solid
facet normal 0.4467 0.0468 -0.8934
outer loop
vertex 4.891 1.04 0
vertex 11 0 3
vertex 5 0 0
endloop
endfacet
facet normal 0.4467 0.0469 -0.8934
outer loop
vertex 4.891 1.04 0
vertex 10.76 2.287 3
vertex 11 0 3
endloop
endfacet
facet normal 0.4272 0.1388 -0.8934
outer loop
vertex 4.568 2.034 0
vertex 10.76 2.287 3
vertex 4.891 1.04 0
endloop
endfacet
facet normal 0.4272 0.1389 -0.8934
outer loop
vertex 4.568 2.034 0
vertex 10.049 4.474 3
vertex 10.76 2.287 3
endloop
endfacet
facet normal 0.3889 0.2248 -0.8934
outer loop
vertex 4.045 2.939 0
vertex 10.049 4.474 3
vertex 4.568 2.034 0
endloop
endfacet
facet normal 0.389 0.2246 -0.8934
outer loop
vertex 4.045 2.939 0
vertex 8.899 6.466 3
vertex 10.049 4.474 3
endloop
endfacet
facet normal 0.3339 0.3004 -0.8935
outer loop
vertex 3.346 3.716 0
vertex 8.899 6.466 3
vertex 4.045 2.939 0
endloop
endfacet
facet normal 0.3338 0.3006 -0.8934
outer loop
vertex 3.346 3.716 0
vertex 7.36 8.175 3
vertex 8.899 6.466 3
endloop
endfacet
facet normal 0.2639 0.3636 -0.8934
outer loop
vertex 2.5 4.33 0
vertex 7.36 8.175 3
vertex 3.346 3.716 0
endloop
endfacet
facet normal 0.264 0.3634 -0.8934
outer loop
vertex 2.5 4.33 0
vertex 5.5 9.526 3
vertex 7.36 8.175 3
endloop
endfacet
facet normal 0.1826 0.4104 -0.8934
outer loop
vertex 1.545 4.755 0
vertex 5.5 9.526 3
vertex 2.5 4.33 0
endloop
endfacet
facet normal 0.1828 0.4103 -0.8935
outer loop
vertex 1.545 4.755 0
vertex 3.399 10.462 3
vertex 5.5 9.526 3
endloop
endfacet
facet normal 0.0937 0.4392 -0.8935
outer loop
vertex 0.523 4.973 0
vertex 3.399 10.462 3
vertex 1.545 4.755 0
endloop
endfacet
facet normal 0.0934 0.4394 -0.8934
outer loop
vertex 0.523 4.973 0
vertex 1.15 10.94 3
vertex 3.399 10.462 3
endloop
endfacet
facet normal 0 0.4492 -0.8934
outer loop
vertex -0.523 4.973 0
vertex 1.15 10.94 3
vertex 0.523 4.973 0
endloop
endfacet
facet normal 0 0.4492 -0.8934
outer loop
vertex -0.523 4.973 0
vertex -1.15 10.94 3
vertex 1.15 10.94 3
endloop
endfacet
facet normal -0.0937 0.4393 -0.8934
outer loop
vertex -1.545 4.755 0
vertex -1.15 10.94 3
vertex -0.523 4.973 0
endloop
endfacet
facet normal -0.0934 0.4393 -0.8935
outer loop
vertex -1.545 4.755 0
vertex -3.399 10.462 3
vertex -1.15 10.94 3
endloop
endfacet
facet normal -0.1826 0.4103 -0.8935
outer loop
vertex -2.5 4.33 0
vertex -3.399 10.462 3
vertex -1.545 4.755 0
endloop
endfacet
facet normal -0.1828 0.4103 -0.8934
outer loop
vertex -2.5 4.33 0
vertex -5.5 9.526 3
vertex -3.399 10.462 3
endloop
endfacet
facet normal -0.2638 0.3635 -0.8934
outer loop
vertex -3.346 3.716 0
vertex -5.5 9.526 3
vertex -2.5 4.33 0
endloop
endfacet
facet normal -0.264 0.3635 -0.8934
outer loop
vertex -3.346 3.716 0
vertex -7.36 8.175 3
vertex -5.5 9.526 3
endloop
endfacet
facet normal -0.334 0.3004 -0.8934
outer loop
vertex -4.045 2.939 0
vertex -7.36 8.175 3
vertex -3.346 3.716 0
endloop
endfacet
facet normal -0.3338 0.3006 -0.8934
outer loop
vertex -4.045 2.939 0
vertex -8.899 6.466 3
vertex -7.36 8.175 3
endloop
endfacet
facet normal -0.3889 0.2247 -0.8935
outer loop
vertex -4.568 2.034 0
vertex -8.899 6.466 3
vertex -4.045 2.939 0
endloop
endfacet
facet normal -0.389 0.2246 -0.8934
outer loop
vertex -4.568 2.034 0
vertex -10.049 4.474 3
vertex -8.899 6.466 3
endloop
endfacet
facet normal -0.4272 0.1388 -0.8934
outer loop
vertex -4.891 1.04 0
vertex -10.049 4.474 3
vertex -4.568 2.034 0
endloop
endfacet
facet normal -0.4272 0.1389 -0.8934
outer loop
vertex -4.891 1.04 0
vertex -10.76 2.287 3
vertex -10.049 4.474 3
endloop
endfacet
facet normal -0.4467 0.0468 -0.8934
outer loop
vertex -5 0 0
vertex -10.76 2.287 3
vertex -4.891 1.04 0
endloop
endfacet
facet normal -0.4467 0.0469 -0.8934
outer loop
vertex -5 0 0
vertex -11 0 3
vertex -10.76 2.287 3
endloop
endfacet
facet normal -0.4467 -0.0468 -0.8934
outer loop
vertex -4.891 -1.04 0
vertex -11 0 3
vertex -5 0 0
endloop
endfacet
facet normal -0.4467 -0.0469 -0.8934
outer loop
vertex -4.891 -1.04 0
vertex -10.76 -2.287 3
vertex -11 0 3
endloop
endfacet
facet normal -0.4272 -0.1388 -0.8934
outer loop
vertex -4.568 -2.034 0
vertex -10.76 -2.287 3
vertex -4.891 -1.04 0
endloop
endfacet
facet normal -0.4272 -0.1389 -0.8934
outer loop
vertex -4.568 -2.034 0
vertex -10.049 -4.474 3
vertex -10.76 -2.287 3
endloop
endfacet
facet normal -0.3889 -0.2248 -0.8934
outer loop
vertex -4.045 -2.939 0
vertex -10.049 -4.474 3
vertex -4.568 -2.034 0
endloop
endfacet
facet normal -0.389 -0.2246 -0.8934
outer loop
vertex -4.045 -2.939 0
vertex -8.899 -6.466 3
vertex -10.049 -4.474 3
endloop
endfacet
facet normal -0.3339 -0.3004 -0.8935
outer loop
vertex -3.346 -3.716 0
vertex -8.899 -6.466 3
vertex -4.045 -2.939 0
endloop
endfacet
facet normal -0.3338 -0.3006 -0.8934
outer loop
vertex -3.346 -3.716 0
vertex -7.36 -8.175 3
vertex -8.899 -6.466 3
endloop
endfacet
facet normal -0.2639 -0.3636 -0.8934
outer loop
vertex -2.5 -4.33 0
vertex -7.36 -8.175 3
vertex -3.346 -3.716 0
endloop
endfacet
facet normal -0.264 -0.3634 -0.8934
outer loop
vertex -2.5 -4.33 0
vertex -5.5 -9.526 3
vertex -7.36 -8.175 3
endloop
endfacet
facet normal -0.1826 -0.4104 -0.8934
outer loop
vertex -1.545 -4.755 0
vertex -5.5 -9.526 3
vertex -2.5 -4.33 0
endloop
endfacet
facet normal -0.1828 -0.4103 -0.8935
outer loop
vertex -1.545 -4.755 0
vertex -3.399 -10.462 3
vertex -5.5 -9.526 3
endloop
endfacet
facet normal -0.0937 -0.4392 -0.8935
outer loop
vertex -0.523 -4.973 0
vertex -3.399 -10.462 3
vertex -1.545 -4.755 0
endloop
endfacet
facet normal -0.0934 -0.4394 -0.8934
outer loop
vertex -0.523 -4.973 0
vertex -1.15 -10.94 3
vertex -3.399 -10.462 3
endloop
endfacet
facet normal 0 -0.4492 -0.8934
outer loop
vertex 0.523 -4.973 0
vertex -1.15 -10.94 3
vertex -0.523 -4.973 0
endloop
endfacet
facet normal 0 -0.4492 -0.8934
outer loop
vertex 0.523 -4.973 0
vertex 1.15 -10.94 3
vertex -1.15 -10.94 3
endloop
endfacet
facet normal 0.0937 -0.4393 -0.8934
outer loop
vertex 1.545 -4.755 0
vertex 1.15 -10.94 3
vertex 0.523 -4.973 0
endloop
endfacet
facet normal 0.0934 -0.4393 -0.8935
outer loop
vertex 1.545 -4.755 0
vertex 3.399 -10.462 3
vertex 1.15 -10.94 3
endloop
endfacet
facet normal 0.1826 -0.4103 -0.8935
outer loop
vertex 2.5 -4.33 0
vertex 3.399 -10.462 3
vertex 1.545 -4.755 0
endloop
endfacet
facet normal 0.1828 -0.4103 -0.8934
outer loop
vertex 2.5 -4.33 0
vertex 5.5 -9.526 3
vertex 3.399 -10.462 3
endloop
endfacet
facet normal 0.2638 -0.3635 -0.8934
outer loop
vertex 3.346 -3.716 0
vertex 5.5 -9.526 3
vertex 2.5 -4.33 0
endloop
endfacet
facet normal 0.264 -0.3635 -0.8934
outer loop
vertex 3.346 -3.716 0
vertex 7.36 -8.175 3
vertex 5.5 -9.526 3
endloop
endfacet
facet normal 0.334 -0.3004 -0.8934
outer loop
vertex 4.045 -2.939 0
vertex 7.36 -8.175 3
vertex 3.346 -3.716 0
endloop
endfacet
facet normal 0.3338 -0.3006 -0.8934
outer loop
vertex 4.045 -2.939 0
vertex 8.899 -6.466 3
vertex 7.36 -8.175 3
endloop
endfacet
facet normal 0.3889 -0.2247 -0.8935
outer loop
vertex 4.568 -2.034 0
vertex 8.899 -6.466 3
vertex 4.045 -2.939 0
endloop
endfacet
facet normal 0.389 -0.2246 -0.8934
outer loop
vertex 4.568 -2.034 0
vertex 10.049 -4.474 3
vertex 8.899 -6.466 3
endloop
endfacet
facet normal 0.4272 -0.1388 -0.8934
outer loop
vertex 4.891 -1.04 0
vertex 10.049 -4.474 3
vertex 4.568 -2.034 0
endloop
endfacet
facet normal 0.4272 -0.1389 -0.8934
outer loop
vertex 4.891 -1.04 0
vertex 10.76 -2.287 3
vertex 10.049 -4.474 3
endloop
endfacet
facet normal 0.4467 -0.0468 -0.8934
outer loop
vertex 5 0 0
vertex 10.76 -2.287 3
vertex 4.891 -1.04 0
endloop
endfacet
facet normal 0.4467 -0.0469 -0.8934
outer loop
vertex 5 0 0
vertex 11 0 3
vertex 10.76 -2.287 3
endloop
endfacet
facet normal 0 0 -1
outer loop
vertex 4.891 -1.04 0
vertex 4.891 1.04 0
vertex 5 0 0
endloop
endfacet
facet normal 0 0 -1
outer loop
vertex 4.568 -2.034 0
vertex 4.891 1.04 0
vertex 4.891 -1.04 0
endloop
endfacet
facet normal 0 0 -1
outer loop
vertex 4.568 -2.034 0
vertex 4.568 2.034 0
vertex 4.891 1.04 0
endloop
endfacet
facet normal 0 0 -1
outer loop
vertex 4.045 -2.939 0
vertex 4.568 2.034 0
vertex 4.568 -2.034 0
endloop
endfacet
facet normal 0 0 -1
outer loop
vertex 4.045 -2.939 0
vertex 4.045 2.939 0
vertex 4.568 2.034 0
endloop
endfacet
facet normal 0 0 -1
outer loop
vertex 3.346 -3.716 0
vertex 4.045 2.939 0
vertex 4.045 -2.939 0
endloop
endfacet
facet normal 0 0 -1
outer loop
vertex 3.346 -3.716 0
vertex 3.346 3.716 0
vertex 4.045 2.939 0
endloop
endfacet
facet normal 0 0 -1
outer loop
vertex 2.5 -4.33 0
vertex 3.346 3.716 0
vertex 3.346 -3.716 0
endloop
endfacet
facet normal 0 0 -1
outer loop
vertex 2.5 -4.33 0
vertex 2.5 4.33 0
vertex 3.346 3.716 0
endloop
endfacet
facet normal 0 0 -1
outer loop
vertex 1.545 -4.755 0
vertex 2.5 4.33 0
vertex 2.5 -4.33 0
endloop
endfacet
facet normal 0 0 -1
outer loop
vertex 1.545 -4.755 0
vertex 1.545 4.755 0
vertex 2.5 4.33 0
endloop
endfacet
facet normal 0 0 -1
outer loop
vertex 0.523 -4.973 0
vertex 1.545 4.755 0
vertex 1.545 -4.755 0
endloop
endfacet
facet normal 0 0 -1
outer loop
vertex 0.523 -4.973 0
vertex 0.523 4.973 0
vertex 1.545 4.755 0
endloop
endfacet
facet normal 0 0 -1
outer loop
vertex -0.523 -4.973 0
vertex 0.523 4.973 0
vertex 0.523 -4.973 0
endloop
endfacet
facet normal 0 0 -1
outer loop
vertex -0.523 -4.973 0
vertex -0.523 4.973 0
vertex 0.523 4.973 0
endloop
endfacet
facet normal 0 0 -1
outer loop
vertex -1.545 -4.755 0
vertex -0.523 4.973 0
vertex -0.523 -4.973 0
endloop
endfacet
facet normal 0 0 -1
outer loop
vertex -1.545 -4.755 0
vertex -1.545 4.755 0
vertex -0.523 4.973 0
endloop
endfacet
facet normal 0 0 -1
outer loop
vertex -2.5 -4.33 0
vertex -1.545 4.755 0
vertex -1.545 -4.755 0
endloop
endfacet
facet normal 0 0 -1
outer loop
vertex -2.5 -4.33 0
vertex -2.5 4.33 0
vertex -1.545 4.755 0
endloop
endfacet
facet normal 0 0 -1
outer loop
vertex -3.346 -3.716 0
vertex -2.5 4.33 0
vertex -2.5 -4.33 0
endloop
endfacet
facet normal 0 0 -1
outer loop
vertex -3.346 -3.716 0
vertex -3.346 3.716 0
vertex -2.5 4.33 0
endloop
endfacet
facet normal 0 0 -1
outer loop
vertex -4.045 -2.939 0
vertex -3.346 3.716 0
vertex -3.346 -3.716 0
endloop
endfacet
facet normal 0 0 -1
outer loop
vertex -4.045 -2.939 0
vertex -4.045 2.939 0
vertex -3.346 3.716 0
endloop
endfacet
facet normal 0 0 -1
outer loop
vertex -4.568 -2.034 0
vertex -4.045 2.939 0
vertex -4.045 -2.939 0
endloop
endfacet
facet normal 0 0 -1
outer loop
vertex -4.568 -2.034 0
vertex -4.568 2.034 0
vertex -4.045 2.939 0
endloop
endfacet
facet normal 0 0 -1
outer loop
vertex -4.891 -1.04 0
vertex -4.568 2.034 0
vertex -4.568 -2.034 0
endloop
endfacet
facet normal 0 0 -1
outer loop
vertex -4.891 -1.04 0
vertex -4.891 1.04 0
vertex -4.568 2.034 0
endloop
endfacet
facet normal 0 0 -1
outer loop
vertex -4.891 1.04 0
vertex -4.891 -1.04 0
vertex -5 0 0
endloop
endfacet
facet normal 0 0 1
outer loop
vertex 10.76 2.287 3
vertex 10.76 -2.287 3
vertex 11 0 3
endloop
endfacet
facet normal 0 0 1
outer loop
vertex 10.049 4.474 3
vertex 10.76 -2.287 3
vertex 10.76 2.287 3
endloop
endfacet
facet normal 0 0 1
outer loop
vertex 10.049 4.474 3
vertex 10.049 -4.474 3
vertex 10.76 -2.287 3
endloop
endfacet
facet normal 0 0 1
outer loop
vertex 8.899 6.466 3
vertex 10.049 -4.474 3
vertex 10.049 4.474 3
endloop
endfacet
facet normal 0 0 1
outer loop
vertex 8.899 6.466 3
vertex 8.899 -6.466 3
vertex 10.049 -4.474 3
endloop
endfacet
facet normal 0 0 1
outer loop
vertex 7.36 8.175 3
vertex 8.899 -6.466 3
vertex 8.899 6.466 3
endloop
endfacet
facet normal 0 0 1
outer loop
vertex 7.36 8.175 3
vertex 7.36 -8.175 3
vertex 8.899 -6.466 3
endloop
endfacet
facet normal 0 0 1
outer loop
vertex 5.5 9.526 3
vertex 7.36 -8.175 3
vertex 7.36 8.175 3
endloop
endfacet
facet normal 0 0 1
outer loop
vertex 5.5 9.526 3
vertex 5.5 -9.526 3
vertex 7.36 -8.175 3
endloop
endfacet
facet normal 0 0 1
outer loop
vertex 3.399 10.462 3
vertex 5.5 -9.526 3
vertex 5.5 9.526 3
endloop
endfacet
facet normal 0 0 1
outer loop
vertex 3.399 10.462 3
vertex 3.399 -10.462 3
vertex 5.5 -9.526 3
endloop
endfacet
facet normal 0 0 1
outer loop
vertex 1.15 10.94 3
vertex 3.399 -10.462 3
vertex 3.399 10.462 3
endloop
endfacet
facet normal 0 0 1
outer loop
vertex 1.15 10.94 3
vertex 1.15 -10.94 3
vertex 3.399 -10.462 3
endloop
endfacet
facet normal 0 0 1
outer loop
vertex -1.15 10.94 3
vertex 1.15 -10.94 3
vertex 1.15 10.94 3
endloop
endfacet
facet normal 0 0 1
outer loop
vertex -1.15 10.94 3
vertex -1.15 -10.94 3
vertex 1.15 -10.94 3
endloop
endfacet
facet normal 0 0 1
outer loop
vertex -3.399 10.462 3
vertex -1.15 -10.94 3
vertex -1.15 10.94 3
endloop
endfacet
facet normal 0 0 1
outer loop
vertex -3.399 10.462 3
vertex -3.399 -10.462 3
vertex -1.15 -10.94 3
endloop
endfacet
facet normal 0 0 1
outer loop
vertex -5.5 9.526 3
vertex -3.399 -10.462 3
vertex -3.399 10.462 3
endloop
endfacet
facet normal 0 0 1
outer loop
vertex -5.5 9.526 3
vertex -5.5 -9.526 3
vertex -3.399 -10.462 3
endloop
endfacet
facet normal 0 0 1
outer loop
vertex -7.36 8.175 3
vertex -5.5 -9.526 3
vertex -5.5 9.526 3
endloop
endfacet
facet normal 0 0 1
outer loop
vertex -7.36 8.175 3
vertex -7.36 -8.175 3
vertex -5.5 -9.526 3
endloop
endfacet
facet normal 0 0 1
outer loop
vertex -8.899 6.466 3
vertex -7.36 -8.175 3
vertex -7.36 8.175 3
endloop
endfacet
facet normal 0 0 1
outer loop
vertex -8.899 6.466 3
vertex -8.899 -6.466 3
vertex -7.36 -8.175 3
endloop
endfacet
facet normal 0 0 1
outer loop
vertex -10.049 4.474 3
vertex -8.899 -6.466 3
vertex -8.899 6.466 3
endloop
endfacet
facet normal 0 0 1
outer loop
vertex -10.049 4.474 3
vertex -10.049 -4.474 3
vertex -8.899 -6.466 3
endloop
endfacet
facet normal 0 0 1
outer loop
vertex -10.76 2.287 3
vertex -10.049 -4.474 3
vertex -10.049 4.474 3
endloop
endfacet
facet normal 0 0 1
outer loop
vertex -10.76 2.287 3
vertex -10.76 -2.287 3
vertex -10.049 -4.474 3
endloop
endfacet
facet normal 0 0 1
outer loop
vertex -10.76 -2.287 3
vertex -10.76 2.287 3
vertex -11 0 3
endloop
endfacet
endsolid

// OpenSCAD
// Generated by SolidPython 1.0.1 on 2020-07-28 23:56:47


cylinder(h = 3, r1 = 5, r2 = 11);
/***********************************************
*********      SolidPython code:      **********
************************************************
 
# import packages: SolidPython
from solid import *
from solid.utils import *
from itertools import chain, combinations


class Resize:

    def __init__(self, scad_file):
        self.scad_file = scad_file
        #self.scad_file = import_scad(scad_file)
        # cone/cylinder param:
        self.r1 = 0
        self.r2 = 0
        self.h = 0
        # rectangular prism param:
        self.w = 0
        self.l = 0
        # ellipse param:
        self.r = 0

    # import OpenScad code (file name corresponds to shape)


    # classify shape + parameters
    def assign(self, param1, param2, param3):
        if self.scad_file == 'cone.scad':
            self.r1 = param1
            self.r2 = param2
            self.h = param3
        elif self.scad_file == 'cylinder.scad':
            self.r1 = param1
            self.r2 = param2
            self.h = param3
        elif self.scad_file == 'rectangularPrism.scad':
            self.h = param1
            self.l = param2
            self.w = param3
        else:
            self.r = param1
            self.h = param2

    # resize parameters
    def iterate(self):
        x = range(3, 20, 2)
        i = 1
        if self.scad_file == 'cone.scad':
            tempList = list(combinations(x, 3))
            print(tempList)
            for i in range(0, 3):
                param1 = tempList[i][0]
                param2 = tempList[i][1]
                param3 = tempList[i][2]
                filepath = 'produced_scad_files/' + 'cone' + str(param1) + '_' + str(param2) + '_' + str(param3) + '.scad'
                scad_render_to_file(cylinder(h=param1, r1=param2, r2=param3), filepath)

        elif self.scad_file == 'cylinder.scad':
            tempList = list(combinations(x, 3))
            for i in range(0, 3):
                param1 = tempList[i][0]
                param2 = tempList[i][1]
                param3 = tempList[i][2]
                filepath = 'produced_scad_files/' + 'cylinder' + str(param1) + '_' + str(param2) + '_' + str(param3) + '.scad'
                scad_render_to_file(cylinder(h=param1, r1=param2, r2=param3), filepath)

        elif self.scad_file == 'rectangularPrism.scad':
            tempList = list(combinations(x, 3))
            for i in range(0, 3):
                param1 = tempList[i][0]
                param2 = tempList[i][1]
                param3 = tempList[i][2]
                filepath = 'produced_scad_files/' + 'rectangularPrism' + str(param1) + '_' + str(param2) + '_' + str(
                    param3) + '.scad'
                scad_render_to_file(cube(size=(param1, param2, param3)), filepath)

        else:
            tempList = list(combinations(x, 2))
            for i in range(0, 2):
                param1 = tempList[i][0]
                param2 = tempList[i][1]
                filepath = 'produced_scad_files/' + 'ellipse' + str(param1) + '_' + str(param2) + '_' + '.scad'
                scad_render_to_file(sphere(param1, param2), filepath)

    def render_to_scadfile(self):
        scad_render_to_file(scad, 'example.scad') 
 
************************************************/
